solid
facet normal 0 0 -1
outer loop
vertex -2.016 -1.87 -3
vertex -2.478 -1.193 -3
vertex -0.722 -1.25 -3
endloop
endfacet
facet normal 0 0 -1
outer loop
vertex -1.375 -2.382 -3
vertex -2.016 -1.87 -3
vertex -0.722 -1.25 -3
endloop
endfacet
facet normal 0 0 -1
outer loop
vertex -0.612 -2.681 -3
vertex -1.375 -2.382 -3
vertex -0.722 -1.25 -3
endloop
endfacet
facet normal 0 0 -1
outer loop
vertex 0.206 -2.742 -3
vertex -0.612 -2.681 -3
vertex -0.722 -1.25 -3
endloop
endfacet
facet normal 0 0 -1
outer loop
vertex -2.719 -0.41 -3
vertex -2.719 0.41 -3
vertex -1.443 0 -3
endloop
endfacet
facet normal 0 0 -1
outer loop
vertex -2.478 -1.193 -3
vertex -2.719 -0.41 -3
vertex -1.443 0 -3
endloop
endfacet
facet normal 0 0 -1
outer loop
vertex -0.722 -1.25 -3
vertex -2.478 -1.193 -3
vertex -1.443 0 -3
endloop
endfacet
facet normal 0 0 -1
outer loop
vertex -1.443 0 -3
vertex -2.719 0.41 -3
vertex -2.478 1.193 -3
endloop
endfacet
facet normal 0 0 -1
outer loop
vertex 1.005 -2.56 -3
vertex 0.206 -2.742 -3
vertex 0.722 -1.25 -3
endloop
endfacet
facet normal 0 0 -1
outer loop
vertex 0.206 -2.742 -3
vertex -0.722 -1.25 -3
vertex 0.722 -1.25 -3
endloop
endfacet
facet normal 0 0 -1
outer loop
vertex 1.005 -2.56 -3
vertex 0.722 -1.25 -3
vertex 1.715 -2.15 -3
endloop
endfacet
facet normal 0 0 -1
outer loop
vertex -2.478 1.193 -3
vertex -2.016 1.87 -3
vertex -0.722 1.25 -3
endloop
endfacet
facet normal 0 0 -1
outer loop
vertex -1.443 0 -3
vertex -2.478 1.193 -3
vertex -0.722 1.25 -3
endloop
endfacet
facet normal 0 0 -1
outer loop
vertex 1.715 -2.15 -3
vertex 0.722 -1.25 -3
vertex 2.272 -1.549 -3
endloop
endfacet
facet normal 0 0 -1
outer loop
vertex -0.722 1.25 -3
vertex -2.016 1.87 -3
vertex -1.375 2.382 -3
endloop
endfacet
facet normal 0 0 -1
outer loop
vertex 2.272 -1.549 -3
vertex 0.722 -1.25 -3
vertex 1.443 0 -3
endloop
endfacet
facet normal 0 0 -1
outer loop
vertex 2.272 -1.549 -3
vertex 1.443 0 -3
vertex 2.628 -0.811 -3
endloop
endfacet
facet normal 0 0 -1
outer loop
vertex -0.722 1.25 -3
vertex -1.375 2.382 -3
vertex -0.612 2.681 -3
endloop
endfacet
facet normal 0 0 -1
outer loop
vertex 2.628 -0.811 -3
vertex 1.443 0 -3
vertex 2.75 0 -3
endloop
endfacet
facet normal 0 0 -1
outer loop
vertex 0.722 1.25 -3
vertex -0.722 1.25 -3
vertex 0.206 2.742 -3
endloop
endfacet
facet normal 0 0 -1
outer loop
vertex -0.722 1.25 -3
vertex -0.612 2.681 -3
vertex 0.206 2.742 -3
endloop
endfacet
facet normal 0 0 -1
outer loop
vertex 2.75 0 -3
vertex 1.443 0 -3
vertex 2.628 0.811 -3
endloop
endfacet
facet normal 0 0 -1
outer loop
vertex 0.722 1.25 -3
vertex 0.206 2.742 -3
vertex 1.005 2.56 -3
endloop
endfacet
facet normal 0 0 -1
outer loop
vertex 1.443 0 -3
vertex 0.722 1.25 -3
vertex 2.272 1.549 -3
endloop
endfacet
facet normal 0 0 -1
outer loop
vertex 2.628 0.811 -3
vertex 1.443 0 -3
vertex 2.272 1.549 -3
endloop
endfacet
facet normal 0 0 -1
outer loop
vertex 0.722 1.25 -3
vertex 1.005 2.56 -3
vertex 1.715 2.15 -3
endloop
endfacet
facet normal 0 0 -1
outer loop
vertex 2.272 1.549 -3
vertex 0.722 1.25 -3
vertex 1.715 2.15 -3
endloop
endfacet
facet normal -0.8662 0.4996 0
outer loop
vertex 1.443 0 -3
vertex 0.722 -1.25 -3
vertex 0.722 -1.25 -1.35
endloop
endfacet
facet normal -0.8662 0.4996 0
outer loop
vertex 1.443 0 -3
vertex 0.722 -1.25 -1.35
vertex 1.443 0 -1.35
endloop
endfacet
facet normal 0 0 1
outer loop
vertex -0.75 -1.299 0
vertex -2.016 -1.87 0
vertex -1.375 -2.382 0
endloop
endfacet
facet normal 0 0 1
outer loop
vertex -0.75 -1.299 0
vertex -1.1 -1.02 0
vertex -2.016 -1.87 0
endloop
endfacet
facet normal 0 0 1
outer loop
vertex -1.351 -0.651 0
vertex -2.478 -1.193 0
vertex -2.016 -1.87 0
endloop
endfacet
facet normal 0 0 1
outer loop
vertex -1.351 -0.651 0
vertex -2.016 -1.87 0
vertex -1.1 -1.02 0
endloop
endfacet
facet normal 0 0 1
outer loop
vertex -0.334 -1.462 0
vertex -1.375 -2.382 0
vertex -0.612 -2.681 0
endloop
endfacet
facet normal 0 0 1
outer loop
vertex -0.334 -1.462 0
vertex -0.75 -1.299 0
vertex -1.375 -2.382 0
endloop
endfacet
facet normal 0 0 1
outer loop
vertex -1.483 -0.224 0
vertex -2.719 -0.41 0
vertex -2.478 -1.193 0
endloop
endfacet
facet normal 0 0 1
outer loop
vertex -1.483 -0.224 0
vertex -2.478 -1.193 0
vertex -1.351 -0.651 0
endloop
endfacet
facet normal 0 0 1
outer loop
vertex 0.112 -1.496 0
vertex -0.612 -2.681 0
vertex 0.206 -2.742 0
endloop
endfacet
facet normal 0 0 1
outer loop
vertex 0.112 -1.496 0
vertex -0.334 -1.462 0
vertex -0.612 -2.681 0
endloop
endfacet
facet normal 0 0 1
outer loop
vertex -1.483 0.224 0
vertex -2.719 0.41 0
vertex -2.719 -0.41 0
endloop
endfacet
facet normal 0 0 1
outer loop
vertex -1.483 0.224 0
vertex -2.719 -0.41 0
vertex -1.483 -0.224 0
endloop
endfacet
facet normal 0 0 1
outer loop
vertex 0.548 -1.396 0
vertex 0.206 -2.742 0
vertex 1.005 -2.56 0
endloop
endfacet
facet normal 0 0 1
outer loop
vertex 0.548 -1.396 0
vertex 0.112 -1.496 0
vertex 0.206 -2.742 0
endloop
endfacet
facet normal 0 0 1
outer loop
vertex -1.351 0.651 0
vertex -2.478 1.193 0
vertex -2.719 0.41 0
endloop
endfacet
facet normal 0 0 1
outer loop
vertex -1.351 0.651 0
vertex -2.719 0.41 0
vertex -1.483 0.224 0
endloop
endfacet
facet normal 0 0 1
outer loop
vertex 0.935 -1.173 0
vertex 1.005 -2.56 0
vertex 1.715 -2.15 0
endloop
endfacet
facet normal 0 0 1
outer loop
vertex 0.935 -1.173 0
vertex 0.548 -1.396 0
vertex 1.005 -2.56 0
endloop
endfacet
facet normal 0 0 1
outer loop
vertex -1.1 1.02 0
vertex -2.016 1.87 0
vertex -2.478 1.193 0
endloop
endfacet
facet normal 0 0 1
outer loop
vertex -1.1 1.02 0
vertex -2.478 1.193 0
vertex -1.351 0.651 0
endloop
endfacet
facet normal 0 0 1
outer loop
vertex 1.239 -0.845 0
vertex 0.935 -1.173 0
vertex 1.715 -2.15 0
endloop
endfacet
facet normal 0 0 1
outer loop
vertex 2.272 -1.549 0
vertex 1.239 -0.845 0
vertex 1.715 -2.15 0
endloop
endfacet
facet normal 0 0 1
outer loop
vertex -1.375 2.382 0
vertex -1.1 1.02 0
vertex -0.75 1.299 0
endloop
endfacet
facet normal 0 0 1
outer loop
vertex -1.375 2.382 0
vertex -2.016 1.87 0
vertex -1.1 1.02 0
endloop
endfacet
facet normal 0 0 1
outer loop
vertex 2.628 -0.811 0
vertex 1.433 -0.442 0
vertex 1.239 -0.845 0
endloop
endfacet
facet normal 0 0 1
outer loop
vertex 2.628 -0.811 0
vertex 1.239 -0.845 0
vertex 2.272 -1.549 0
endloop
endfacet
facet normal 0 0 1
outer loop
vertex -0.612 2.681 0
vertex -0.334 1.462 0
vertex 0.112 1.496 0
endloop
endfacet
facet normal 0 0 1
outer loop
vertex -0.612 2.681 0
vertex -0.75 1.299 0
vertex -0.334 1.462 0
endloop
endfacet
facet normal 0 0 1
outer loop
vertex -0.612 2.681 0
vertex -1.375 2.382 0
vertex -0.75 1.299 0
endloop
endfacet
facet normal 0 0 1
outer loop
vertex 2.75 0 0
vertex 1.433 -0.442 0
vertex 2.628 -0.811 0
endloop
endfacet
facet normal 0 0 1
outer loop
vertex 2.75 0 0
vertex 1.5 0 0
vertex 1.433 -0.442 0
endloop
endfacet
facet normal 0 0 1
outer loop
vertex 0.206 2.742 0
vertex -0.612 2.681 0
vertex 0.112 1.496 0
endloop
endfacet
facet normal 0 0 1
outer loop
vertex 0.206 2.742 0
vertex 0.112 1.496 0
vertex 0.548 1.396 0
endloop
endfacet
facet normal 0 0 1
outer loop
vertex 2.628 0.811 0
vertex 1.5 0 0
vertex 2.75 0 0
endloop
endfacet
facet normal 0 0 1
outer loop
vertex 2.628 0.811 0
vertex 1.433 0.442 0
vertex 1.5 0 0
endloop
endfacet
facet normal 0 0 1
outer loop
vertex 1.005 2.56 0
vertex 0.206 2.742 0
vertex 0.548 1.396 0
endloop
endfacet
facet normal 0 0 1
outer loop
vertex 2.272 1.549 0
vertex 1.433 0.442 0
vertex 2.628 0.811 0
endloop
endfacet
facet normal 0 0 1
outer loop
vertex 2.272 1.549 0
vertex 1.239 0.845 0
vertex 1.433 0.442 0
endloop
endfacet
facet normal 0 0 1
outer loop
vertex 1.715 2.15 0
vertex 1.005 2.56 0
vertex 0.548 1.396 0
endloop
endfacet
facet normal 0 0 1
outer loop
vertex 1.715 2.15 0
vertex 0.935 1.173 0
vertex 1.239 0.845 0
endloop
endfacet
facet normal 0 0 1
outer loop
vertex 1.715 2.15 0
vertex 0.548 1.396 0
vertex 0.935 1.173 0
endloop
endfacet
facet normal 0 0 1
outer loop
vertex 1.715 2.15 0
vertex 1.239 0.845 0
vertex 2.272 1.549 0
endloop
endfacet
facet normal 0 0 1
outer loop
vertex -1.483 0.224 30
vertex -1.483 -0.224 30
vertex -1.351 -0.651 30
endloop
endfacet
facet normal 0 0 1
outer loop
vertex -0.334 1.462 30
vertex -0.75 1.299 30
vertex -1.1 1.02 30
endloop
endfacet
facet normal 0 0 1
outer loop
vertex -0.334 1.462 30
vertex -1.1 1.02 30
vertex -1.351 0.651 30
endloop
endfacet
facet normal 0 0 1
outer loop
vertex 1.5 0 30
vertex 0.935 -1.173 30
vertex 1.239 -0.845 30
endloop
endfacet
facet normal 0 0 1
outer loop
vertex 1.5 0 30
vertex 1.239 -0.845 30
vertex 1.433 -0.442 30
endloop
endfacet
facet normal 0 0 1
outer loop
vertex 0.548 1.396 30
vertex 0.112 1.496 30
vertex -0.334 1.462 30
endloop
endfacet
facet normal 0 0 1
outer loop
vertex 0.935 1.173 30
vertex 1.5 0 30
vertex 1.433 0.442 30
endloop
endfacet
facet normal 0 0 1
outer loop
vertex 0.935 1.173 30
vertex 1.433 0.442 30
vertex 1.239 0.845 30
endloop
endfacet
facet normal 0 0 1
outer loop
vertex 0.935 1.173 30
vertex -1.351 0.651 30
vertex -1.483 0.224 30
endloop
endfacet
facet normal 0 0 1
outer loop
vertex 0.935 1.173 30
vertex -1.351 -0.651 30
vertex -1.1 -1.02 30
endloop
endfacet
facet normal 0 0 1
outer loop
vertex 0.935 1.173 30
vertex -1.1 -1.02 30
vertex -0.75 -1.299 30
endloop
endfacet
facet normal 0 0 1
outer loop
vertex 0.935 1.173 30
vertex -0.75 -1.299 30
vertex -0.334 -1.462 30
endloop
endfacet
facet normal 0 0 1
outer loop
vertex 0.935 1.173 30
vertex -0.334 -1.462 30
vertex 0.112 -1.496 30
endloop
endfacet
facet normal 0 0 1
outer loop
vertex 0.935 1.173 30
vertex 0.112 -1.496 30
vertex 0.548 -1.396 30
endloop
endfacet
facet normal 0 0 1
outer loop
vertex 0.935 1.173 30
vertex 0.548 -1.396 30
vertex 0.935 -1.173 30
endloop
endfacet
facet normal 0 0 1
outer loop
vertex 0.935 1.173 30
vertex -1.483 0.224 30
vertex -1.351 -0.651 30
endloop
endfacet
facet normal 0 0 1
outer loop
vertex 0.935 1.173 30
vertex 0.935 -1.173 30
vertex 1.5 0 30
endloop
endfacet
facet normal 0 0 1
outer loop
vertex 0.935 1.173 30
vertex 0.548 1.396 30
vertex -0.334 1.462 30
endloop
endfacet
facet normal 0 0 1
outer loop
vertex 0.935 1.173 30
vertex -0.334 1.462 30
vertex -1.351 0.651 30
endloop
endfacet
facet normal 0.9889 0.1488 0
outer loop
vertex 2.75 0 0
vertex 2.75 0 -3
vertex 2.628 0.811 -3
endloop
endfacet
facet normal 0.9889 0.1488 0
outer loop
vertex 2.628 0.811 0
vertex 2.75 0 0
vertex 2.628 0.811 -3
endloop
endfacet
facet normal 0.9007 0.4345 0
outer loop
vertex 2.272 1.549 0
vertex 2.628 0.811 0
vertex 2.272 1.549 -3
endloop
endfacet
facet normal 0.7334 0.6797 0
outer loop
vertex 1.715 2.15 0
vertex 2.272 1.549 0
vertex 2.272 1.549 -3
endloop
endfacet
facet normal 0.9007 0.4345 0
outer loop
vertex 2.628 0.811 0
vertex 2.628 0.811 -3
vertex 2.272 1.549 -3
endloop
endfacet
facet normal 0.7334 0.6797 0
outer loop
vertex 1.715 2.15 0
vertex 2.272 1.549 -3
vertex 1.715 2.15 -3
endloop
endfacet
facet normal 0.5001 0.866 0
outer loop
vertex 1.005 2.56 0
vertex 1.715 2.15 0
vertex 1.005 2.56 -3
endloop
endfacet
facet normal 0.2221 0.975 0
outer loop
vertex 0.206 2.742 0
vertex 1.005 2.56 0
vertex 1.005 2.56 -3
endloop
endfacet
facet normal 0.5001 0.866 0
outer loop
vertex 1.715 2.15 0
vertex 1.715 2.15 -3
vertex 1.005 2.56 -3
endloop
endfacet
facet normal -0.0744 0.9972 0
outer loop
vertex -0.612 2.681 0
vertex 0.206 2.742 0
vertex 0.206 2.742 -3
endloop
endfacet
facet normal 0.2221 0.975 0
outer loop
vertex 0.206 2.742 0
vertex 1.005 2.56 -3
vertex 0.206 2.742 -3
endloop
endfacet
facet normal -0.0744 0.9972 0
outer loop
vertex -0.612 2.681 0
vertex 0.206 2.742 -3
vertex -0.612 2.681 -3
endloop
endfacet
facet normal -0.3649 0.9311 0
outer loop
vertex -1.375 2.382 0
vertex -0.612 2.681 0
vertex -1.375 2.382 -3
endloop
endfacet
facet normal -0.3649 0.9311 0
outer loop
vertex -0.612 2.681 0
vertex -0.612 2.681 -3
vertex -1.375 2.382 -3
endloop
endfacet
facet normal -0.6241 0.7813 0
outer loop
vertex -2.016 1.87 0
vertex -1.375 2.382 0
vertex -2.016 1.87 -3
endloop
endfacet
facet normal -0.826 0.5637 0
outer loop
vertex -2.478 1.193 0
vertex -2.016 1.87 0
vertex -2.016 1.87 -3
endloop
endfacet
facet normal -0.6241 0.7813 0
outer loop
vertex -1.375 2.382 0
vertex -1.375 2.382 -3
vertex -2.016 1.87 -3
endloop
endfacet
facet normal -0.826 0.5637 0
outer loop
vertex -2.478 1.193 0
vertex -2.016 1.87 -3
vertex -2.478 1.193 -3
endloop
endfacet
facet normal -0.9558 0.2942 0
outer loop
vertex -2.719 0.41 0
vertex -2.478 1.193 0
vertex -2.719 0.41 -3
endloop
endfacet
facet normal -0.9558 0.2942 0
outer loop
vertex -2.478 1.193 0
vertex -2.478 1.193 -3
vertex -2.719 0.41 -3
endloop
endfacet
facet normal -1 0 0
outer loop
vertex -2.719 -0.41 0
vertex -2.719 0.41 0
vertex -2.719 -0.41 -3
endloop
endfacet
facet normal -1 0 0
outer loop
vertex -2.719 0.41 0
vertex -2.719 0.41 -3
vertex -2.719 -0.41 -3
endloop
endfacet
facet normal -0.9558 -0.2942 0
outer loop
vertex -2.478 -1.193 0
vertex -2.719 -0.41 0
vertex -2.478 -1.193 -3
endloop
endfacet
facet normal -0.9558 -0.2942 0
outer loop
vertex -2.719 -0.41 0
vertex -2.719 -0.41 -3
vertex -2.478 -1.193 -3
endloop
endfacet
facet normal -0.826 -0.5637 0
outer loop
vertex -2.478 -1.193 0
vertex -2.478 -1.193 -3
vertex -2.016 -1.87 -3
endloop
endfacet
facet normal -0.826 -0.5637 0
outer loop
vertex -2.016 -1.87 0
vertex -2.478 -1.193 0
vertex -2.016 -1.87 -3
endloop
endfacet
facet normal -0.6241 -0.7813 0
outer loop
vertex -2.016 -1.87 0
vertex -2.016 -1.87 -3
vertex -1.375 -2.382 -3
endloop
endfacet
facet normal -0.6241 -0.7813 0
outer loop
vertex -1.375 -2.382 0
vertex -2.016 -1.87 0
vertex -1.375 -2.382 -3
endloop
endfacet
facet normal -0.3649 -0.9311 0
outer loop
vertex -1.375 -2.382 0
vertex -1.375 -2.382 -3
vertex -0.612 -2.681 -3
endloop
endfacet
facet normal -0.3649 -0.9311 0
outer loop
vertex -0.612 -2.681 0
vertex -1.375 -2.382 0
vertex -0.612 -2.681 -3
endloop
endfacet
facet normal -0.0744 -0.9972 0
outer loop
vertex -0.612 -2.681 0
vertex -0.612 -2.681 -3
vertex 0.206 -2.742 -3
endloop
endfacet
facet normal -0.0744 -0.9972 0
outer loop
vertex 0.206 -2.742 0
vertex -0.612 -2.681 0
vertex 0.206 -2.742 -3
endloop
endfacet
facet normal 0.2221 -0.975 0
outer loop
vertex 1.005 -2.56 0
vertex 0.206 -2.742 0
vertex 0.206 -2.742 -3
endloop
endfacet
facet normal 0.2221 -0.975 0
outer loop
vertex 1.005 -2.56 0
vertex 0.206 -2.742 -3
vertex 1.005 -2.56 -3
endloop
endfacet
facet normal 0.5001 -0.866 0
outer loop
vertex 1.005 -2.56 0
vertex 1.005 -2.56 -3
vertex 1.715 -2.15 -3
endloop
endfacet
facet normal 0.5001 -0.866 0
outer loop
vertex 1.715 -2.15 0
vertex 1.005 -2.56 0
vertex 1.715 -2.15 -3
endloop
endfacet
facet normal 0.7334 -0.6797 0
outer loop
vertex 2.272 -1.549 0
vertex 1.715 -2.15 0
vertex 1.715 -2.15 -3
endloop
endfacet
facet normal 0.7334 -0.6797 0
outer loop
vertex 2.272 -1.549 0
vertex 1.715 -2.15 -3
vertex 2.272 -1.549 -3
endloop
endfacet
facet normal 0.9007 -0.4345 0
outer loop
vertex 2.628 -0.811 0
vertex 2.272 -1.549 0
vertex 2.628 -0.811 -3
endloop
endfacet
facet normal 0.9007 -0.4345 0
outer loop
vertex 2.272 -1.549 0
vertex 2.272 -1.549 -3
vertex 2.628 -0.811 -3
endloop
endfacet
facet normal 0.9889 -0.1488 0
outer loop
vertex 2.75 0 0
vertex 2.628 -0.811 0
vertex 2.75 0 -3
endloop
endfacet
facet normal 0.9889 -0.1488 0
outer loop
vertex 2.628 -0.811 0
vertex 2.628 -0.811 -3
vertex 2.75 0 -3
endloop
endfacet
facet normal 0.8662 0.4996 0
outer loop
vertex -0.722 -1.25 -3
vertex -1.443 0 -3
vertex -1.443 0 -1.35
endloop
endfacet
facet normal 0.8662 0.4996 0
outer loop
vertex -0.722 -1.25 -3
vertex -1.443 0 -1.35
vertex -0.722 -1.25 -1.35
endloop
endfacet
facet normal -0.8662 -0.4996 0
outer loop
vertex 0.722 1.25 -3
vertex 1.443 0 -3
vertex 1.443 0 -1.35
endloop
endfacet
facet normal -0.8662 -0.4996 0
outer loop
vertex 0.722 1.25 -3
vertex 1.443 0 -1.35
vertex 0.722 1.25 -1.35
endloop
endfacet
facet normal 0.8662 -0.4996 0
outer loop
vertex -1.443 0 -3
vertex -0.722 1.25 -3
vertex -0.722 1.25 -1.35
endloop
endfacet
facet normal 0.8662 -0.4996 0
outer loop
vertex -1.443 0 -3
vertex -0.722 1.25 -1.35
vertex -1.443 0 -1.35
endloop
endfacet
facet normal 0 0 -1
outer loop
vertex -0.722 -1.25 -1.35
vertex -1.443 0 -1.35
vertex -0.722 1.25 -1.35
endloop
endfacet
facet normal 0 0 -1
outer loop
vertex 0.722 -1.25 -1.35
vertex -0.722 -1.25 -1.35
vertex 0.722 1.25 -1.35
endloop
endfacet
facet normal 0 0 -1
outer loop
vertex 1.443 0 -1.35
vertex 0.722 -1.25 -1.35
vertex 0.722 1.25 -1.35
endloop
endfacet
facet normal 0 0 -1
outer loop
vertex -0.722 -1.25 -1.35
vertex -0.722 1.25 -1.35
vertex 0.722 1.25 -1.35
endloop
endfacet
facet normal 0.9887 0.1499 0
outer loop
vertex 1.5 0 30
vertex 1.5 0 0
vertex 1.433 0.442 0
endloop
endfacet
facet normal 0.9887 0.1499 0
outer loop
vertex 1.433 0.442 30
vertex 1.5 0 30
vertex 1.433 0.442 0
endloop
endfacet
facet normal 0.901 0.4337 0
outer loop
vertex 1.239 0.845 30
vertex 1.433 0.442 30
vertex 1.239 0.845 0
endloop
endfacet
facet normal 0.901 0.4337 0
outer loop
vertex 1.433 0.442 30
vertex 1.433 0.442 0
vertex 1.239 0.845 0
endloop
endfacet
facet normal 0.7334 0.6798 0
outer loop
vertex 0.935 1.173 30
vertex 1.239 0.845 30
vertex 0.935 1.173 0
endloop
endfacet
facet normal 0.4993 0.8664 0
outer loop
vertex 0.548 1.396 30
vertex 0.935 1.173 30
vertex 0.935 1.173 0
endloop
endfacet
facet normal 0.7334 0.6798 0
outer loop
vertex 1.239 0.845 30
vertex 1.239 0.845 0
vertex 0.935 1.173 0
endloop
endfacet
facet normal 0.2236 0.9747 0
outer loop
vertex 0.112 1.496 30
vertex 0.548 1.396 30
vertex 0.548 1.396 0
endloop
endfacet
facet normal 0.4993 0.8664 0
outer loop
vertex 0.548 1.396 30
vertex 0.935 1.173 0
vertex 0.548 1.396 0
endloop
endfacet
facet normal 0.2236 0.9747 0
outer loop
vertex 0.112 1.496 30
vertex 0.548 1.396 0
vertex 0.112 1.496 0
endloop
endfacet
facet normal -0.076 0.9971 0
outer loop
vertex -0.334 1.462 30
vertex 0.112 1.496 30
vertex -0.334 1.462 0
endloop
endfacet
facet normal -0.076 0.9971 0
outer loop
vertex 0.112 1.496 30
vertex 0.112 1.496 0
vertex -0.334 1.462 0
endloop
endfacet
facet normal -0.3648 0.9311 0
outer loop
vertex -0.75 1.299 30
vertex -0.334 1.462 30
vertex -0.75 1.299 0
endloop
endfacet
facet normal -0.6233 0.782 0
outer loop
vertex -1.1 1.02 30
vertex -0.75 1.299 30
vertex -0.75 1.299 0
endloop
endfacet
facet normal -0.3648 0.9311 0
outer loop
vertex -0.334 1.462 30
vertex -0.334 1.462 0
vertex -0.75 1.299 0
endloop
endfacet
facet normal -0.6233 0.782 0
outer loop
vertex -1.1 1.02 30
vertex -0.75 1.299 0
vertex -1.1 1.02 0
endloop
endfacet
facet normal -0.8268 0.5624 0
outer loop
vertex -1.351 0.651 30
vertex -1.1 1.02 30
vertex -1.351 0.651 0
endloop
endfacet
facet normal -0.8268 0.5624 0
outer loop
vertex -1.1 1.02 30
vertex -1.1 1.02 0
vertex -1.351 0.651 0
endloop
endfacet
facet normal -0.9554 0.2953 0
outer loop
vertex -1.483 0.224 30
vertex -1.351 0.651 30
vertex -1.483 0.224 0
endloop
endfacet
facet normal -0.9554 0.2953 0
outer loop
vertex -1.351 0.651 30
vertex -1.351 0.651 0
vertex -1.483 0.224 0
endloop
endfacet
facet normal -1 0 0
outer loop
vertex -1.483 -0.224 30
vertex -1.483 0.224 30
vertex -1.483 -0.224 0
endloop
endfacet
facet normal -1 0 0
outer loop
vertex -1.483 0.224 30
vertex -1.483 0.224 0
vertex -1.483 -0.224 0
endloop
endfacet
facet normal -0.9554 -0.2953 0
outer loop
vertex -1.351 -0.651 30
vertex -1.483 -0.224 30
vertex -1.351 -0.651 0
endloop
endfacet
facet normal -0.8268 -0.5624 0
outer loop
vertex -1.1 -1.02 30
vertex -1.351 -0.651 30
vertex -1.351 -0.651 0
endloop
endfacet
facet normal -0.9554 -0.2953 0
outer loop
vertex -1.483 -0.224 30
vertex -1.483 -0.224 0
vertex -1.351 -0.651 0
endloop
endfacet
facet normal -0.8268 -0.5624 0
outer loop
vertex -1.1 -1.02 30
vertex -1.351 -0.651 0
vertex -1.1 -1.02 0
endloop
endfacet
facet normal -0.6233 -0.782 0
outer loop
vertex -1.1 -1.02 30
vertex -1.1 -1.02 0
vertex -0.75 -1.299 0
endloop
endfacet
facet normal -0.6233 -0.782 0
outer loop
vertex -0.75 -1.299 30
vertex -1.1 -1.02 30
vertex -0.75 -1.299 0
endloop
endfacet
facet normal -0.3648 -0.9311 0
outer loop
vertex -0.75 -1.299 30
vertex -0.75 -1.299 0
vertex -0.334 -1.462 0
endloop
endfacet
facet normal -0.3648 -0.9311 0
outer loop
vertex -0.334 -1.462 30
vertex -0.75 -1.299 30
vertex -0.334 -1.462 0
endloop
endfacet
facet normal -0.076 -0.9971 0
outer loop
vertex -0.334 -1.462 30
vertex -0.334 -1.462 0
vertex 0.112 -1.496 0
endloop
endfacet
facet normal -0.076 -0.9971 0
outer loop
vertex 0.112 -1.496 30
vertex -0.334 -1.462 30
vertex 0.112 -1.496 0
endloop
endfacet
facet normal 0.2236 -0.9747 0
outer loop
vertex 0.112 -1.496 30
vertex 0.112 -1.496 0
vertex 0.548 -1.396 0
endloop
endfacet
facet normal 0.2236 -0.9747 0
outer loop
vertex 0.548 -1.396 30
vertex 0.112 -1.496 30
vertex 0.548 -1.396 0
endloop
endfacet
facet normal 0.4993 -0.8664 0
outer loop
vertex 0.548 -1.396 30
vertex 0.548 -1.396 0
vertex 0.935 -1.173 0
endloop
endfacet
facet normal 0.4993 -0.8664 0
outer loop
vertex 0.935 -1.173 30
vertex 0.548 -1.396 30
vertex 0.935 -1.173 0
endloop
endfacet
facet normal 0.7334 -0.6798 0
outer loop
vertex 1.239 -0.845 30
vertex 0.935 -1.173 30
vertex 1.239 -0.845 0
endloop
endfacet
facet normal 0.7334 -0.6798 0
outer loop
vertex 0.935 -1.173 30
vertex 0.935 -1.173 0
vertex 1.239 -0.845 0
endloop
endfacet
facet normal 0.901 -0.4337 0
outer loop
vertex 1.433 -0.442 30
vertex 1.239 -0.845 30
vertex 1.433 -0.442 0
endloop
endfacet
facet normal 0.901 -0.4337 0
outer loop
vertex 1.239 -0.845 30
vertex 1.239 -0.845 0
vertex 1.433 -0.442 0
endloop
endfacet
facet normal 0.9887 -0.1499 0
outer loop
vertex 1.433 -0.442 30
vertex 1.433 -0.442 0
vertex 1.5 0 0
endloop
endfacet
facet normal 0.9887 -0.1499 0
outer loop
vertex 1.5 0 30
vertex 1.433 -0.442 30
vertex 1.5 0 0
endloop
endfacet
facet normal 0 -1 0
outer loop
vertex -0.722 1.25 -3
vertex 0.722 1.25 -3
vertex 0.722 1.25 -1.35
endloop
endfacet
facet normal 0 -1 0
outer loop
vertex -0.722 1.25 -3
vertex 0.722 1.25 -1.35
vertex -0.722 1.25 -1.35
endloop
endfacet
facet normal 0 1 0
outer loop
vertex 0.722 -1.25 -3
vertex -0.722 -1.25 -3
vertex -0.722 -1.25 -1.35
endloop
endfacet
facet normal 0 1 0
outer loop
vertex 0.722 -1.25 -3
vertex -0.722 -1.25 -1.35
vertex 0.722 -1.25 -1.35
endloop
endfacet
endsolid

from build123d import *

# Parameters (mm, degrees)
F_01_START                = -3
S01_HEAD_R                = 2.75
F_01_HEAD_DEPTH           = 3
S02_NOMINAL_SHANK_R       = 1.5
F_02_NOMINAL_SHANK_DEPTH  = 30
F_03_START                = -3.1
F_03_HEX_KEY_SOCKET_DEPTH = 1.75


with BuildPart() as part:
    # S01 - Head → 01 - Head (new body)
    with BuildSketch(Plane.XY.offset(F_01_START)):
        Circle(S01_HEAD_R)
    extrude(amount=F_01_HEAD_DEPTH)

    # S02 - Nominal shank → 02 - Nominal shank (add)
    with BuildSketch(Plane.XY):
        Circle(S02_NOMINAL_SHANK_R)
    extrude(amount=F_02_NOMINAL_SHANK_DEPTH)

    # S03 - Hex key socket → 03 - Hex key socket (cut)
    with BuildSketch(Plane.XY.offset(F_03_START)):
        Polygon((1.443375673, 0), (0.721687836, 1.25), (-0.721687836, 1.25), (-1.443375673, 0), (-0.721687836, -1.25), (0.721687836, -1.25), align=None)
    extrude(amount=F_03_HEX_KEY_SOCKET_DEPTH, mode=Mode.SUBTRACT)


solid = part.part
